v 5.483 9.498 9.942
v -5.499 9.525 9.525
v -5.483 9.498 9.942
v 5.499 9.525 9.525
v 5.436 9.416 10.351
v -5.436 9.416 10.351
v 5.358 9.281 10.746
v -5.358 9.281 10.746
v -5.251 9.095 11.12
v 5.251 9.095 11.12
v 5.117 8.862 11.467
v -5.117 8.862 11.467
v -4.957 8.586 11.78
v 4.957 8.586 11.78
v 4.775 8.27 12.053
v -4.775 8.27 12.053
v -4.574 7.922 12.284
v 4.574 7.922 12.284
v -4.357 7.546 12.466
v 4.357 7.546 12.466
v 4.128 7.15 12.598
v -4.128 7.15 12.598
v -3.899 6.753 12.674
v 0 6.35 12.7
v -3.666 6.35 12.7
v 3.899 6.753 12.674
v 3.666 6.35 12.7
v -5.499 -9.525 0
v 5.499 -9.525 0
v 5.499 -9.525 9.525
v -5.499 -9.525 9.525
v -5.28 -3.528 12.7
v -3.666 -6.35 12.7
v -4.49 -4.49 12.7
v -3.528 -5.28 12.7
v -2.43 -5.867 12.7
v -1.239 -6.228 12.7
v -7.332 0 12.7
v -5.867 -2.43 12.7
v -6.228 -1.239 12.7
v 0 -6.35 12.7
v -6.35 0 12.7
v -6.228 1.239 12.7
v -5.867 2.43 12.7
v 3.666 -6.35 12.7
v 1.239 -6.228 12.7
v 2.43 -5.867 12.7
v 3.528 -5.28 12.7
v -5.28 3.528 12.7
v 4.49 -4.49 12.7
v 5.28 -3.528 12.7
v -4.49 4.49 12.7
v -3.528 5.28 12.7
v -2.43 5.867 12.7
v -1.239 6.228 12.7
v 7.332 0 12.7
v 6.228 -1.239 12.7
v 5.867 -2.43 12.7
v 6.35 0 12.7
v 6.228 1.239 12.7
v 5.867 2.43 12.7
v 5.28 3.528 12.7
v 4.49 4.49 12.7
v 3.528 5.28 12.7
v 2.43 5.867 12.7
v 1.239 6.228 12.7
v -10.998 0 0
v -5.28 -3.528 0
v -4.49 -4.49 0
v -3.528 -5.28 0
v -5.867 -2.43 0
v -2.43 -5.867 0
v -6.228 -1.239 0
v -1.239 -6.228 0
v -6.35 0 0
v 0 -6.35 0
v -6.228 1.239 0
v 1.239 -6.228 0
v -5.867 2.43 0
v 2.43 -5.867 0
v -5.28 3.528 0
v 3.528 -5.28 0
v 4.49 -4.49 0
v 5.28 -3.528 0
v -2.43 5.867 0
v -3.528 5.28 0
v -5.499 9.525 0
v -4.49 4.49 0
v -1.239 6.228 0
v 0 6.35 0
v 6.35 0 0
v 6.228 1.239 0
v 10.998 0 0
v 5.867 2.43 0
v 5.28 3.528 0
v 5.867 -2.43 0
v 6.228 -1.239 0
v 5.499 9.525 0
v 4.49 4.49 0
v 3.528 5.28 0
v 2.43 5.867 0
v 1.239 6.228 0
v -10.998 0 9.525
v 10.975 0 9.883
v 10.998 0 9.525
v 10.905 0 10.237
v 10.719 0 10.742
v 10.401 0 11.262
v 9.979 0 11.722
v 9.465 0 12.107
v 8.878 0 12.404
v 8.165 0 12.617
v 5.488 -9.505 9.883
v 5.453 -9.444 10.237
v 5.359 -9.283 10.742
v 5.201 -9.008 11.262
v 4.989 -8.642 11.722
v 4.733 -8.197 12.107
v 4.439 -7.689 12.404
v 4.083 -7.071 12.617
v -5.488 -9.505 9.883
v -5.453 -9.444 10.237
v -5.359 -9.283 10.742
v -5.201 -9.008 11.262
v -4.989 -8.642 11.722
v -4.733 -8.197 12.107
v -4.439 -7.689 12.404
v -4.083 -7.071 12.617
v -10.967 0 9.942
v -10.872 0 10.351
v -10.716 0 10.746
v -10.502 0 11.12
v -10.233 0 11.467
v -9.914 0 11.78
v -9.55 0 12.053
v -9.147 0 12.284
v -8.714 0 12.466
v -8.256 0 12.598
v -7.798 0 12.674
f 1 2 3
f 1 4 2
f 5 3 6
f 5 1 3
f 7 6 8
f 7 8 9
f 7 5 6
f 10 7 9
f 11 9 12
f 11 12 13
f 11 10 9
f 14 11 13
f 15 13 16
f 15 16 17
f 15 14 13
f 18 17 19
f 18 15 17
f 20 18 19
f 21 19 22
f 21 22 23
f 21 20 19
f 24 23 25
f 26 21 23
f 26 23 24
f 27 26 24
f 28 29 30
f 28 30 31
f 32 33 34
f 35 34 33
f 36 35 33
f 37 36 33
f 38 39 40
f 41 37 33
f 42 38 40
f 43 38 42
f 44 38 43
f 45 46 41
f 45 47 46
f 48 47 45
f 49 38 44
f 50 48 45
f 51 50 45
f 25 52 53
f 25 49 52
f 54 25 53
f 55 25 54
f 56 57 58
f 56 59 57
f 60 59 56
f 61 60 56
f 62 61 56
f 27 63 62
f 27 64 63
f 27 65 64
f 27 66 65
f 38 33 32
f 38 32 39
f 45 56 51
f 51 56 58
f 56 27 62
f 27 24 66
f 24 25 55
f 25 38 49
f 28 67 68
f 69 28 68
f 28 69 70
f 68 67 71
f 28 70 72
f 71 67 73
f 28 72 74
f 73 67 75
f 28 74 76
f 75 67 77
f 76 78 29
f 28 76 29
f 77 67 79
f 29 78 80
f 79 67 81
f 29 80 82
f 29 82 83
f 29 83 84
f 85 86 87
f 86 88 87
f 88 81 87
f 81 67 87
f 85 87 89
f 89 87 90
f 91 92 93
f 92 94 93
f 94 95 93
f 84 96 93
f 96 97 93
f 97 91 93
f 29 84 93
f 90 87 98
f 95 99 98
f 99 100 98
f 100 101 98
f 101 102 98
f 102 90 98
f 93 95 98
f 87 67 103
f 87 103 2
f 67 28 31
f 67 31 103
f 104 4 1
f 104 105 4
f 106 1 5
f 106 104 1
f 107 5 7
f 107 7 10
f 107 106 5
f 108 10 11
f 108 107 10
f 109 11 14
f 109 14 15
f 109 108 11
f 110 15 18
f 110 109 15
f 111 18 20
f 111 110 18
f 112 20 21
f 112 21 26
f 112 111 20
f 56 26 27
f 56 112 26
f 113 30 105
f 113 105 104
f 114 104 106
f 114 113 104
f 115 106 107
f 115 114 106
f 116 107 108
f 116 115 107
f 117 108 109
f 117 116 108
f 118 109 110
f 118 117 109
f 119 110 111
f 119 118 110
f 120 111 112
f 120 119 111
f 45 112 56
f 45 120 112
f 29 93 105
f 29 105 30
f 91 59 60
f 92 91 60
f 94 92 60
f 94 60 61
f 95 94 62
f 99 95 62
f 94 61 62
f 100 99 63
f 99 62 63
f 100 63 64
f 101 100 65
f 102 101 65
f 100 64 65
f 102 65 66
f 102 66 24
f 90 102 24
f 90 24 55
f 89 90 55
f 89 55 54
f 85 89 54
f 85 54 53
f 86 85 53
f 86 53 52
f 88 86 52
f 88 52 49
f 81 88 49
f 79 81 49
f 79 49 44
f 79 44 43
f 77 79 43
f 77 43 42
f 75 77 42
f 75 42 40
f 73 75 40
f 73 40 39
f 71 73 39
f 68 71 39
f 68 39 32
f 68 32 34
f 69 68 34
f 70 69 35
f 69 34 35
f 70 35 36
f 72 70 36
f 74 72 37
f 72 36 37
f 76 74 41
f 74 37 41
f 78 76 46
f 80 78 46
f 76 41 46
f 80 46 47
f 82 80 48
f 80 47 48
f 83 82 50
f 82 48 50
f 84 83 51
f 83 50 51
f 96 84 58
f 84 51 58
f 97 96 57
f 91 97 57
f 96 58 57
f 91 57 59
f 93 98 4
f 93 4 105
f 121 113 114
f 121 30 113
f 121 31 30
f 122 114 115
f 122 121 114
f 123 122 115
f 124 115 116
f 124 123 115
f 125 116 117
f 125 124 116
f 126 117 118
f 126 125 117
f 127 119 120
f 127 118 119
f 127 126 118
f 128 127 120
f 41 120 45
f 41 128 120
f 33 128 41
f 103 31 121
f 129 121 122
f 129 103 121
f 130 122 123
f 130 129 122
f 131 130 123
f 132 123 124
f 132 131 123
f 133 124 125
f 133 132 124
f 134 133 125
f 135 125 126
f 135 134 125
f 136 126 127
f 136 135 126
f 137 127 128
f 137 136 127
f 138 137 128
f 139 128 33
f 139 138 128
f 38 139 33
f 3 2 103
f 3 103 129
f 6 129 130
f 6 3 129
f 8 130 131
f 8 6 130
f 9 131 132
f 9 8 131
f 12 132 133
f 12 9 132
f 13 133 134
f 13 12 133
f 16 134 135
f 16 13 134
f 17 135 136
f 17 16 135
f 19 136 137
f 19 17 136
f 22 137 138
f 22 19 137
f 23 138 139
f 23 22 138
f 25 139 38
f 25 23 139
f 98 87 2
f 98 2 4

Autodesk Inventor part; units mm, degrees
ref_plane "YZ Plane" through (0, 0, 0) normal (1, 0, 0) x (0, 1, 0)
ref_plane "XZ Plane" through (0, 0, 0) normal (0, 1, 0) x (-1, 0, 0)
ref_plane "XY Plane" through (0, 0, 0) normal (0, 0, 1) x (1, 0, 0)
sketch "Sketch1" plane through (0, 0, 0) normal (0, 0, 1) x (1, 0, 0)
  line L0 (-10.9985, 0) -> (-5.4993, 9.525)
  line L1 (-5.4993, 9.525) -> (5.4993, 9.525)
  line L2 (5.4993, 9.525) -> (10.9985, 0)
  line L3 (10.9985, 0) -> (5.4993, -9.525)
  line L4 (5.4993, -9.525) -> (-5.4993, -9.525)
  line L5 (-5.4993, -9.525) -> (-10.9985, 0)
  point P0 (0, 0)
  point P1 (0, 0)
  dimension "d0" = 19.05
extrude "Extrusion1" add sketch "Sketch1" along normal blind 12.7
sketch "Sketch2" plane through (0, 0, 12.7) normal (0, 0, 1) x (1, 0, 0)
  circle A0 centre (0, 0) radius 6.35
  dimension "d3" = 12.7
extrude "Extrusion2" cut sketch "Sketch2" against normal blind 12.7
thread "Thread1" size "1/2-13 UNC" class "2B" standard "ANSI Unified Screw Threads" full length
fillet "Fillet1" radius 3.175 6 edges at (0, 9.525, 12.7) (8.2489, 4.7625, 12.7) (8.2489, -4.7625, 12.7) (0, -9.525, 12.7) (-8.2489, -4.7625, 12.7) (-8.2489, 4.7625, 12.7)
properties part number "LucasCharles part 5 nut final" material "Stainless Steel, Austenitic"
